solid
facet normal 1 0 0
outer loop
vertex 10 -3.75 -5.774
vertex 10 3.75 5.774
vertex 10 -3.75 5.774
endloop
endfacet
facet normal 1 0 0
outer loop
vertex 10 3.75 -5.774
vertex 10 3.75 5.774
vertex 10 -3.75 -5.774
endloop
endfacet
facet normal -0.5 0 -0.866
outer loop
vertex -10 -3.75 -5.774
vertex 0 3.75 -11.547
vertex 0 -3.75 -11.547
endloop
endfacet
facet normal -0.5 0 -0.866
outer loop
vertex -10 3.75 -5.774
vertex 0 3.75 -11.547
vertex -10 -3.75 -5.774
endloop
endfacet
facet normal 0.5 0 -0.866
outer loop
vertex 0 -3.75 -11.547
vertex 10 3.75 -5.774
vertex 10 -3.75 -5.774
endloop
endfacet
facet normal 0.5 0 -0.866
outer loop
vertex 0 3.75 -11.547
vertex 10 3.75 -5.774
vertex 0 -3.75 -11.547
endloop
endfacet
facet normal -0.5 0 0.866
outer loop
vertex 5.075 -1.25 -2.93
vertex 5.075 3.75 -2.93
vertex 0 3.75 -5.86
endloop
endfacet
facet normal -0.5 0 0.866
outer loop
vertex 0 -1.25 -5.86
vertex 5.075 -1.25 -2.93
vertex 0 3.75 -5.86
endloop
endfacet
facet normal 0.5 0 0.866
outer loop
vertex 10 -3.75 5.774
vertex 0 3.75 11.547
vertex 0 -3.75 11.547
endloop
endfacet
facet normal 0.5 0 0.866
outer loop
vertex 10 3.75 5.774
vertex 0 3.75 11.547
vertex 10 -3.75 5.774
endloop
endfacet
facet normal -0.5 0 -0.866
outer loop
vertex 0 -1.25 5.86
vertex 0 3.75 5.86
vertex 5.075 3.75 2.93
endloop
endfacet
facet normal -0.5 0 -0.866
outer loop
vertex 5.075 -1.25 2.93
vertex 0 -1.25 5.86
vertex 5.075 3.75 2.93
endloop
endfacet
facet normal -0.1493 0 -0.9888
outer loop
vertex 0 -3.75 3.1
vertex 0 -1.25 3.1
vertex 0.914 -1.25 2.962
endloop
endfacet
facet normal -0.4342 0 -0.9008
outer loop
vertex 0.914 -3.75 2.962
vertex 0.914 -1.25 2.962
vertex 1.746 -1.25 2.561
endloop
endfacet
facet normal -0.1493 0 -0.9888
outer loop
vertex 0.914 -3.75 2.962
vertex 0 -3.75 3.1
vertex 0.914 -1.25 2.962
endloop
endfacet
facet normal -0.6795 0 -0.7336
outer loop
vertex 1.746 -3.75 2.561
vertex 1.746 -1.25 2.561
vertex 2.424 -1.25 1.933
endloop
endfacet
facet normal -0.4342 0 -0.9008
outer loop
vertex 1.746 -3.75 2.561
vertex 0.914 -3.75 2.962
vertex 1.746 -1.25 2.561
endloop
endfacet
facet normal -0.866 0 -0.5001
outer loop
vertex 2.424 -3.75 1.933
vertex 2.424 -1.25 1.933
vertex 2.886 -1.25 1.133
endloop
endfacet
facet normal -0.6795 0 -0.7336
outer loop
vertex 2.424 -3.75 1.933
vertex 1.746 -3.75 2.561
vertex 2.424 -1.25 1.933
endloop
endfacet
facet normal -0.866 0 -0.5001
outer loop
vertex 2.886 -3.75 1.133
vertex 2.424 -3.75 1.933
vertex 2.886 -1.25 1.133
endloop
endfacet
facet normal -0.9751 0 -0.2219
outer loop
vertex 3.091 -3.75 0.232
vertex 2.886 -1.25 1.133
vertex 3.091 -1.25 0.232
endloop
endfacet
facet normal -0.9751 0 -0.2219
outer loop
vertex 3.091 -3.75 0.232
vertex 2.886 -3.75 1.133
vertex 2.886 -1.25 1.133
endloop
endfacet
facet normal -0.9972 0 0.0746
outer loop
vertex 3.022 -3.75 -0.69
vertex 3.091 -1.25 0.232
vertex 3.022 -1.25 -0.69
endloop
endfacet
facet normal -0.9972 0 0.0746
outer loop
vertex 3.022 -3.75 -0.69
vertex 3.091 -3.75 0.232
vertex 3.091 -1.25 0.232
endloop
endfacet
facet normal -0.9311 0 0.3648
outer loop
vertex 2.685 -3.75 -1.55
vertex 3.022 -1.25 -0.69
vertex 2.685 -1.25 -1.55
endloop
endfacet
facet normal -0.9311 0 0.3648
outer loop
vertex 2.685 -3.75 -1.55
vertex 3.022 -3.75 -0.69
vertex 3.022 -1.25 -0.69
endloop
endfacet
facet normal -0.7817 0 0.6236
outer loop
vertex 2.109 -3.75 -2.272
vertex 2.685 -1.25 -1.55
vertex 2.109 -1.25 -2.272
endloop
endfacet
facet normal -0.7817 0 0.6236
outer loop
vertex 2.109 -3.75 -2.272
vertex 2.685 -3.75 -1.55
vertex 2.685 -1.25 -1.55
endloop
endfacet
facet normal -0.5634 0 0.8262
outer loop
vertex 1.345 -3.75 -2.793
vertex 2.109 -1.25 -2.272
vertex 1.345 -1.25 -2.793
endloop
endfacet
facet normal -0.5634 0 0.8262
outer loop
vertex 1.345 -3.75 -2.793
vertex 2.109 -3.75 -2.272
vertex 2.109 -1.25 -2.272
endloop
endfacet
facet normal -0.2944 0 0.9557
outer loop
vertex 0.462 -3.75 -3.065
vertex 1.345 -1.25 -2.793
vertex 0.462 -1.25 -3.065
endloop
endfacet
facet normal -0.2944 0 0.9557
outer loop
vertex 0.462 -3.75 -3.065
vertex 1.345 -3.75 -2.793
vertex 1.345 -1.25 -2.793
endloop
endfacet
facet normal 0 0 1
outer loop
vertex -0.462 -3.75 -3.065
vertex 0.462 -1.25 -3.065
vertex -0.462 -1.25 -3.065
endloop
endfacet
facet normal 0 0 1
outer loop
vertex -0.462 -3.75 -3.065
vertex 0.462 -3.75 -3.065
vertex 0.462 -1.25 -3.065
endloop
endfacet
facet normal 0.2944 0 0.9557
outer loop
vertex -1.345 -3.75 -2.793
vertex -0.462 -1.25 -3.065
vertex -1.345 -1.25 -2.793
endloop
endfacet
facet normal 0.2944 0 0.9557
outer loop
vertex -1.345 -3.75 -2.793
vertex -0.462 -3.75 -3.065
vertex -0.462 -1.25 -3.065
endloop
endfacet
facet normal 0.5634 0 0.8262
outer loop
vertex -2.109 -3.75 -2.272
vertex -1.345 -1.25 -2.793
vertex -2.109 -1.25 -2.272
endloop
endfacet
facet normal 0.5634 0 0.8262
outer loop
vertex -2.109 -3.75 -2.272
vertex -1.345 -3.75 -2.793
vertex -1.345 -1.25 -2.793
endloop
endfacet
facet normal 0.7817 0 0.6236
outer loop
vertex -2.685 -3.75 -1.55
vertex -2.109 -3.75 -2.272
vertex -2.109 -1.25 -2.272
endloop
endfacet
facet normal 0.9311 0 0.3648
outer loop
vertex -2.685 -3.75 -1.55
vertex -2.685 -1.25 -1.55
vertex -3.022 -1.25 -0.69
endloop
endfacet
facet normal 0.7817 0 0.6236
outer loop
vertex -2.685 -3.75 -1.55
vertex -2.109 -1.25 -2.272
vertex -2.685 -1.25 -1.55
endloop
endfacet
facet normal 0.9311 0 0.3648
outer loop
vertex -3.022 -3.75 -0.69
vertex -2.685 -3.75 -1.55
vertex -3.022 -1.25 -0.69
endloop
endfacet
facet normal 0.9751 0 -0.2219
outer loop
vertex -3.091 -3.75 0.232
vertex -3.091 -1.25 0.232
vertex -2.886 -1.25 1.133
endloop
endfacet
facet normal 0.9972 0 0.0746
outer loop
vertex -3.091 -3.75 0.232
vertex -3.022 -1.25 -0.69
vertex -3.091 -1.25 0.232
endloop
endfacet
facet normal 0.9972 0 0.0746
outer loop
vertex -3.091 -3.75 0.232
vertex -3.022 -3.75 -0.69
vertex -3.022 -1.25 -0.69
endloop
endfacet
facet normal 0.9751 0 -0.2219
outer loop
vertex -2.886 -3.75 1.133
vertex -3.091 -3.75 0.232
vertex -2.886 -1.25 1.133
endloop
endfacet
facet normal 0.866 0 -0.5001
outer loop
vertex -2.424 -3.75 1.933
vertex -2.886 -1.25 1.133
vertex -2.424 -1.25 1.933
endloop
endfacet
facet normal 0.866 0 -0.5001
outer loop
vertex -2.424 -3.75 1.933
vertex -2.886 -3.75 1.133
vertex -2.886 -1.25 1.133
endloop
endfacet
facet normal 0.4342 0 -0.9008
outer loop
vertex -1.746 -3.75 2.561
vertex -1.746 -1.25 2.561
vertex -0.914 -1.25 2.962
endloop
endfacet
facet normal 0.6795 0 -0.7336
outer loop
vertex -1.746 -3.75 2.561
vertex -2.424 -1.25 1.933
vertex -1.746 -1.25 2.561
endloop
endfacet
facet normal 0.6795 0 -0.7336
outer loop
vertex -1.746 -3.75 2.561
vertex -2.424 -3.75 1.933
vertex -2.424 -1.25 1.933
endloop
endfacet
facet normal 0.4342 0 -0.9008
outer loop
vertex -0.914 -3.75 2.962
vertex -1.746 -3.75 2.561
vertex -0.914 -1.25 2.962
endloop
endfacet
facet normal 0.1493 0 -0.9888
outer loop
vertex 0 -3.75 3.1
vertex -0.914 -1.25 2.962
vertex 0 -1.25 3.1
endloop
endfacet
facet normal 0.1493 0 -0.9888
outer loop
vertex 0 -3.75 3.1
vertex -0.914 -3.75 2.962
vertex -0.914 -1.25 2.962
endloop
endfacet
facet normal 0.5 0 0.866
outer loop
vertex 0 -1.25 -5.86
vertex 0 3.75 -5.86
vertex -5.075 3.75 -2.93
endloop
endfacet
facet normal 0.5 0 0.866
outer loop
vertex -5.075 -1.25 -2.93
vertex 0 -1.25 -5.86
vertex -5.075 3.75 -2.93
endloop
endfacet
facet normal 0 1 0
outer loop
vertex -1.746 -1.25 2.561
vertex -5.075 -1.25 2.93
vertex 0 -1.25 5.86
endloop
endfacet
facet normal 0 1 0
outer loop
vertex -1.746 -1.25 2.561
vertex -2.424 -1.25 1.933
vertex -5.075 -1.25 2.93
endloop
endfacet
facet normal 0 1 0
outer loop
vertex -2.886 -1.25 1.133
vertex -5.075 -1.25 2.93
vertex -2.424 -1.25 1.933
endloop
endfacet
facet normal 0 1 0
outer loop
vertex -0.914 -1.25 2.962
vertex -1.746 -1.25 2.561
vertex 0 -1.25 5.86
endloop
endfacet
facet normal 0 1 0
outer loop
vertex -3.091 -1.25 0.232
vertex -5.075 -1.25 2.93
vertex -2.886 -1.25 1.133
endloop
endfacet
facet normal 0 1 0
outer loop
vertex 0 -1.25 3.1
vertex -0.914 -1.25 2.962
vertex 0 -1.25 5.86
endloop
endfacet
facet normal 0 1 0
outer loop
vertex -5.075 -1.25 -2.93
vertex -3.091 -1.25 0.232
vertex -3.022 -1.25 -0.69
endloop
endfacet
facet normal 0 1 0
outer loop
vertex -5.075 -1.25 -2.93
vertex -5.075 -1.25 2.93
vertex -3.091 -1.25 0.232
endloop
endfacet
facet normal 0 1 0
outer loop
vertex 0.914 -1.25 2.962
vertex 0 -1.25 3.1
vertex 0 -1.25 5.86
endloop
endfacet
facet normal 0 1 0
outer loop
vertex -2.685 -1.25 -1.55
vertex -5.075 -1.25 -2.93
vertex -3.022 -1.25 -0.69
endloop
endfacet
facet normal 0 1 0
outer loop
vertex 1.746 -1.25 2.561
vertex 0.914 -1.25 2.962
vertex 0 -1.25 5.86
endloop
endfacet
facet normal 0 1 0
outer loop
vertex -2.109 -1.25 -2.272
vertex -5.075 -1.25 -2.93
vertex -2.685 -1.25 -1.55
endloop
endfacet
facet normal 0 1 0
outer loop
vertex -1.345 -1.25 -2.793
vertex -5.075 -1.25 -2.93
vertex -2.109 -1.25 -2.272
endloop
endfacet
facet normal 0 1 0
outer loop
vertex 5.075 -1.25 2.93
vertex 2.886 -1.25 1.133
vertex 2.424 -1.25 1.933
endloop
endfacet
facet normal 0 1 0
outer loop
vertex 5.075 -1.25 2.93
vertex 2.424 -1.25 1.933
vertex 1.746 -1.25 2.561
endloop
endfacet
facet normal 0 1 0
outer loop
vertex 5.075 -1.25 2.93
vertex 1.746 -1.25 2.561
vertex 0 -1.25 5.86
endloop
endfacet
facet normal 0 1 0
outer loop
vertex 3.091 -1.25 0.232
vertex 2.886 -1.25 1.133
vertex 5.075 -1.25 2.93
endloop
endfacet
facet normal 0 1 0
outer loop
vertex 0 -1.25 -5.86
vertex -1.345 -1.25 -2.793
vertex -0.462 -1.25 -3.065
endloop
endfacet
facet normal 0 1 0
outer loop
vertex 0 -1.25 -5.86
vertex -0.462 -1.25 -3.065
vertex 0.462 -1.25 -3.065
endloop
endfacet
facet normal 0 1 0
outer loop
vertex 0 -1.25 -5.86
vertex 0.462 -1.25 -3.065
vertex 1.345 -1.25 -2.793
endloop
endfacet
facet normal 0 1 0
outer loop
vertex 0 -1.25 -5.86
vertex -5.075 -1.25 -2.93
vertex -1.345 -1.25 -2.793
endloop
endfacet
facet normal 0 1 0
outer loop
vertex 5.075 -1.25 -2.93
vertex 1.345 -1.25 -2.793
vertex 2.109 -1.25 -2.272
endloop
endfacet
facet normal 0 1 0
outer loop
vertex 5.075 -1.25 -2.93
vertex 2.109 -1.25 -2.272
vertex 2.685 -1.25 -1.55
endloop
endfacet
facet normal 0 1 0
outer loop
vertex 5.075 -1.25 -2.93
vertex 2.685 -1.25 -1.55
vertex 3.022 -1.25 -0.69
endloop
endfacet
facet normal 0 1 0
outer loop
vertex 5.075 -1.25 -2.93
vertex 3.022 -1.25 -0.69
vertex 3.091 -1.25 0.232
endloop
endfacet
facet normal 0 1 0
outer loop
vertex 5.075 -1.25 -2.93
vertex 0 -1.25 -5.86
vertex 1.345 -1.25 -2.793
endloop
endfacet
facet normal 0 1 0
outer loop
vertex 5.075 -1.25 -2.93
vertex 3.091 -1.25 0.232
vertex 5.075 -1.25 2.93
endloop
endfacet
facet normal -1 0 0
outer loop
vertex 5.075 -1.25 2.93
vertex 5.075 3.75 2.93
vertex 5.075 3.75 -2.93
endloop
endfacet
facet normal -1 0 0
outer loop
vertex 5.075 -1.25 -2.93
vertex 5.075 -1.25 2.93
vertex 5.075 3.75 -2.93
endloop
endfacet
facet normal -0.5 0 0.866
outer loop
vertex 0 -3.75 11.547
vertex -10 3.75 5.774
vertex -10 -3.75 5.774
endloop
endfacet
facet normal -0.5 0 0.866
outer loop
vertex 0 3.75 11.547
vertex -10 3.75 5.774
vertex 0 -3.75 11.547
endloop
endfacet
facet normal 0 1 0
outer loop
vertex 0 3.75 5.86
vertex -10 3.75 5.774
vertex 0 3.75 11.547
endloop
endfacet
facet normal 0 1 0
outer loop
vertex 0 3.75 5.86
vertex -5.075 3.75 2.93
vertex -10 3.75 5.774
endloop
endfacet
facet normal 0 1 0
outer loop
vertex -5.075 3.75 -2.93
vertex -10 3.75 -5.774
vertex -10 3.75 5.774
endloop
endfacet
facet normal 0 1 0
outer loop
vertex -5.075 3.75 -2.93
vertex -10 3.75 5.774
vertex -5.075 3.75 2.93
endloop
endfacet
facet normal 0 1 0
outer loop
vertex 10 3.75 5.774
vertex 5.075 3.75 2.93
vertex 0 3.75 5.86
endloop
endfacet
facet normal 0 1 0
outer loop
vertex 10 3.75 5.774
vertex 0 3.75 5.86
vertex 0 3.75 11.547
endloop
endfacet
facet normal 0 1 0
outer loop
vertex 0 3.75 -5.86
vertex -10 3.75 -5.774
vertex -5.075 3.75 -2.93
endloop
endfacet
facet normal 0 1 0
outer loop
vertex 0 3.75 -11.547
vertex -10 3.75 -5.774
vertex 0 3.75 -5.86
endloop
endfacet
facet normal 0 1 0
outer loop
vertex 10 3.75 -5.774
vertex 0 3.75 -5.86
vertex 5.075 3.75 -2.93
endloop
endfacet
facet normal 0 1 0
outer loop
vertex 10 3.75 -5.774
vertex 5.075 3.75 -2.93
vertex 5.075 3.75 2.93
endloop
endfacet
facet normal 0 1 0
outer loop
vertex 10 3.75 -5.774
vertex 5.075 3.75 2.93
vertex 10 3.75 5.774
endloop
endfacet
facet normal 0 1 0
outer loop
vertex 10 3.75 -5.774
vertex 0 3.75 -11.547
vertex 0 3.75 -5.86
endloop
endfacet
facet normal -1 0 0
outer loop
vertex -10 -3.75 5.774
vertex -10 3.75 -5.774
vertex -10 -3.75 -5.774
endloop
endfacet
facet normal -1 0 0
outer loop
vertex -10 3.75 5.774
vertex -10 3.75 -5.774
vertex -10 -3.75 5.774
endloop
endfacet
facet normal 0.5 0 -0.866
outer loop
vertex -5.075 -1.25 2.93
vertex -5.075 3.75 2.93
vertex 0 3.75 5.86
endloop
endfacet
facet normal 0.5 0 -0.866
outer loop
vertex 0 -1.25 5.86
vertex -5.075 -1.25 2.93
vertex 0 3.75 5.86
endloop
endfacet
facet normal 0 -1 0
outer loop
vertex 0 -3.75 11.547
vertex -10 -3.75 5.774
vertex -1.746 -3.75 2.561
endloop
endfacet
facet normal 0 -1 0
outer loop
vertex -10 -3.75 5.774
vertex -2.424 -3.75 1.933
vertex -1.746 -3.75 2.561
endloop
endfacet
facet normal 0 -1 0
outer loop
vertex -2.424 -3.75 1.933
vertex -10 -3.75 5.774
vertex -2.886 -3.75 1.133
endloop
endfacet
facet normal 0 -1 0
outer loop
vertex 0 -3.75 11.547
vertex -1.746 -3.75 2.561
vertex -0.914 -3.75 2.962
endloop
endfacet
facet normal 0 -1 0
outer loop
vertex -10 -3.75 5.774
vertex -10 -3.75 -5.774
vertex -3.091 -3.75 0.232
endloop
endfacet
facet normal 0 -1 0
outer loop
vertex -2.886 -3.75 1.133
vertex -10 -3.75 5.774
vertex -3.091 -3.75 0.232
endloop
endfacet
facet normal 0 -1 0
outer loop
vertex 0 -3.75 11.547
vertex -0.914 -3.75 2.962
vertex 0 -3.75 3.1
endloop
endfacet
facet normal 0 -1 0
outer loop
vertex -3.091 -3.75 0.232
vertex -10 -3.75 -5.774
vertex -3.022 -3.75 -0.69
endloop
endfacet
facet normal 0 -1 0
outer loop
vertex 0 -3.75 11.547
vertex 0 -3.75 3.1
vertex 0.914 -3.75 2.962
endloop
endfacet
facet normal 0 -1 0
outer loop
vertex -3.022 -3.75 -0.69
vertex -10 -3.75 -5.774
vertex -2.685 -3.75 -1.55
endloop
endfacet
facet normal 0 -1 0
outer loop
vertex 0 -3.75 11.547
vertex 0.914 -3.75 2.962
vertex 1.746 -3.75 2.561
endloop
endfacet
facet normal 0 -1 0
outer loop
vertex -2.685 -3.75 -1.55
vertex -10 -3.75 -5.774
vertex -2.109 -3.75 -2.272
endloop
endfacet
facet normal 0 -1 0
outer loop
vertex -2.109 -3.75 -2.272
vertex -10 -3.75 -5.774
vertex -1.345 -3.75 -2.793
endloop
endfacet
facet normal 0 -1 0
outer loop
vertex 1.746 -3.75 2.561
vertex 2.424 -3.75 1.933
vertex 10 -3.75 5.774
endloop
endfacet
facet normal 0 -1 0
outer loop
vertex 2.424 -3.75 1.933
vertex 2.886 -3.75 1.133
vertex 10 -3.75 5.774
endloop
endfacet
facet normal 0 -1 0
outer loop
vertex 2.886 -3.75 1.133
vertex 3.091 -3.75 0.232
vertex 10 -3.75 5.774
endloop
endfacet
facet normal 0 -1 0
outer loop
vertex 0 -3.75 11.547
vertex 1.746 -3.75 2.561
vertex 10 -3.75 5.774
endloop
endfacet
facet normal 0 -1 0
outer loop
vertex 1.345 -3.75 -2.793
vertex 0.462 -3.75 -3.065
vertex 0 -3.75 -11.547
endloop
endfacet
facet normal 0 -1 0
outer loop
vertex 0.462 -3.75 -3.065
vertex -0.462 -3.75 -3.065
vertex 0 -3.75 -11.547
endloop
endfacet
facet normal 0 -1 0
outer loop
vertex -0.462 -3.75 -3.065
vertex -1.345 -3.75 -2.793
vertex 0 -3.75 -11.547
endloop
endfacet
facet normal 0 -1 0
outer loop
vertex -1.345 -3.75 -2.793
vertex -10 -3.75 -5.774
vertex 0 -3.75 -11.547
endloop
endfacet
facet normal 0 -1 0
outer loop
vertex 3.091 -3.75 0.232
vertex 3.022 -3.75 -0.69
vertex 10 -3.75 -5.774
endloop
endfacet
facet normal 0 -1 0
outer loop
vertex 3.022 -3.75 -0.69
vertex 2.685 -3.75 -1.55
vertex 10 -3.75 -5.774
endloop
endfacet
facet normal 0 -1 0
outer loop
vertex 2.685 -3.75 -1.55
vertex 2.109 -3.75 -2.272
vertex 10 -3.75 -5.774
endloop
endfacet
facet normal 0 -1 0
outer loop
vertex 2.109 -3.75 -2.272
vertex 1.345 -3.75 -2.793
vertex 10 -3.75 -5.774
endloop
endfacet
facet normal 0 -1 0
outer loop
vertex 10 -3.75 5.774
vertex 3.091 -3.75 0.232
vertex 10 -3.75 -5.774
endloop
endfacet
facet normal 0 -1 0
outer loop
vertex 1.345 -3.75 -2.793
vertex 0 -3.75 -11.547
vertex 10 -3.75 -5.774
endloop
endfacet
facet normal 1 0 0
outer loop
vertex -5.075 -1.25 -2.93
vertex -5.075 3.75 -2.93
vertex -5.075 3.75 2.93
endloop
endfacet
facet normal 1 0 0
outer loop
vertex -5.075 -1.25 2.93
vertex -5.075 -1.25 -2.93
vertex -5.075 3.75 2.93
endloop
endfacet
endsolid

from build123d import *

# Parameters (mm, degrees)
SKETCH1_R           = 3.1
BOSS_EXTRUDE1_DEPTH = 3.75
CUT_EXTRUDE1_DEPTH  = 5


with BuildPart() as part:
    # Sketch1 → Boss-Extrude1 (new, symmetric)
    with BuildSketch(Plane(origin=(0, 0, 0), x_dir=(1, 0, 0), z_dir=(0, 1, 0))):
        Polygon((0, -11.547005384), (10, -5.773502692), (10, 5.773502692), (0, 11.547005384), (-10, 5.773502692), (-10, -5.773502692), align=None)
        with Locations(Location((0, 0, 0), (0, 0, 270))):
            Circle(SKETCH1_R, mode=Mode.SUBTRACT)
    extrude(amount=BOSS_EXTRUDE1_DEPTH, both=True)

    # Sketch2 → Cut-Extrude1 (cut)
    with BuildSketch(Plane(origin=(0, 3.75, 0), x_dir=(1, 0, 0), z_dir=(0, 1, 0))):
        Polygon((0, 5.860105232), (-5.075, 2.930052616), (-5.075, -2.930052616), (0, -5.860105232), (5.075, -2.930052616), (5.075, 2.930052616), align=None)
    extrude(amount=-CUT_EXTRUDE1_DEPTH, mode=Mode.SUBTRACT)


solid = part.part
